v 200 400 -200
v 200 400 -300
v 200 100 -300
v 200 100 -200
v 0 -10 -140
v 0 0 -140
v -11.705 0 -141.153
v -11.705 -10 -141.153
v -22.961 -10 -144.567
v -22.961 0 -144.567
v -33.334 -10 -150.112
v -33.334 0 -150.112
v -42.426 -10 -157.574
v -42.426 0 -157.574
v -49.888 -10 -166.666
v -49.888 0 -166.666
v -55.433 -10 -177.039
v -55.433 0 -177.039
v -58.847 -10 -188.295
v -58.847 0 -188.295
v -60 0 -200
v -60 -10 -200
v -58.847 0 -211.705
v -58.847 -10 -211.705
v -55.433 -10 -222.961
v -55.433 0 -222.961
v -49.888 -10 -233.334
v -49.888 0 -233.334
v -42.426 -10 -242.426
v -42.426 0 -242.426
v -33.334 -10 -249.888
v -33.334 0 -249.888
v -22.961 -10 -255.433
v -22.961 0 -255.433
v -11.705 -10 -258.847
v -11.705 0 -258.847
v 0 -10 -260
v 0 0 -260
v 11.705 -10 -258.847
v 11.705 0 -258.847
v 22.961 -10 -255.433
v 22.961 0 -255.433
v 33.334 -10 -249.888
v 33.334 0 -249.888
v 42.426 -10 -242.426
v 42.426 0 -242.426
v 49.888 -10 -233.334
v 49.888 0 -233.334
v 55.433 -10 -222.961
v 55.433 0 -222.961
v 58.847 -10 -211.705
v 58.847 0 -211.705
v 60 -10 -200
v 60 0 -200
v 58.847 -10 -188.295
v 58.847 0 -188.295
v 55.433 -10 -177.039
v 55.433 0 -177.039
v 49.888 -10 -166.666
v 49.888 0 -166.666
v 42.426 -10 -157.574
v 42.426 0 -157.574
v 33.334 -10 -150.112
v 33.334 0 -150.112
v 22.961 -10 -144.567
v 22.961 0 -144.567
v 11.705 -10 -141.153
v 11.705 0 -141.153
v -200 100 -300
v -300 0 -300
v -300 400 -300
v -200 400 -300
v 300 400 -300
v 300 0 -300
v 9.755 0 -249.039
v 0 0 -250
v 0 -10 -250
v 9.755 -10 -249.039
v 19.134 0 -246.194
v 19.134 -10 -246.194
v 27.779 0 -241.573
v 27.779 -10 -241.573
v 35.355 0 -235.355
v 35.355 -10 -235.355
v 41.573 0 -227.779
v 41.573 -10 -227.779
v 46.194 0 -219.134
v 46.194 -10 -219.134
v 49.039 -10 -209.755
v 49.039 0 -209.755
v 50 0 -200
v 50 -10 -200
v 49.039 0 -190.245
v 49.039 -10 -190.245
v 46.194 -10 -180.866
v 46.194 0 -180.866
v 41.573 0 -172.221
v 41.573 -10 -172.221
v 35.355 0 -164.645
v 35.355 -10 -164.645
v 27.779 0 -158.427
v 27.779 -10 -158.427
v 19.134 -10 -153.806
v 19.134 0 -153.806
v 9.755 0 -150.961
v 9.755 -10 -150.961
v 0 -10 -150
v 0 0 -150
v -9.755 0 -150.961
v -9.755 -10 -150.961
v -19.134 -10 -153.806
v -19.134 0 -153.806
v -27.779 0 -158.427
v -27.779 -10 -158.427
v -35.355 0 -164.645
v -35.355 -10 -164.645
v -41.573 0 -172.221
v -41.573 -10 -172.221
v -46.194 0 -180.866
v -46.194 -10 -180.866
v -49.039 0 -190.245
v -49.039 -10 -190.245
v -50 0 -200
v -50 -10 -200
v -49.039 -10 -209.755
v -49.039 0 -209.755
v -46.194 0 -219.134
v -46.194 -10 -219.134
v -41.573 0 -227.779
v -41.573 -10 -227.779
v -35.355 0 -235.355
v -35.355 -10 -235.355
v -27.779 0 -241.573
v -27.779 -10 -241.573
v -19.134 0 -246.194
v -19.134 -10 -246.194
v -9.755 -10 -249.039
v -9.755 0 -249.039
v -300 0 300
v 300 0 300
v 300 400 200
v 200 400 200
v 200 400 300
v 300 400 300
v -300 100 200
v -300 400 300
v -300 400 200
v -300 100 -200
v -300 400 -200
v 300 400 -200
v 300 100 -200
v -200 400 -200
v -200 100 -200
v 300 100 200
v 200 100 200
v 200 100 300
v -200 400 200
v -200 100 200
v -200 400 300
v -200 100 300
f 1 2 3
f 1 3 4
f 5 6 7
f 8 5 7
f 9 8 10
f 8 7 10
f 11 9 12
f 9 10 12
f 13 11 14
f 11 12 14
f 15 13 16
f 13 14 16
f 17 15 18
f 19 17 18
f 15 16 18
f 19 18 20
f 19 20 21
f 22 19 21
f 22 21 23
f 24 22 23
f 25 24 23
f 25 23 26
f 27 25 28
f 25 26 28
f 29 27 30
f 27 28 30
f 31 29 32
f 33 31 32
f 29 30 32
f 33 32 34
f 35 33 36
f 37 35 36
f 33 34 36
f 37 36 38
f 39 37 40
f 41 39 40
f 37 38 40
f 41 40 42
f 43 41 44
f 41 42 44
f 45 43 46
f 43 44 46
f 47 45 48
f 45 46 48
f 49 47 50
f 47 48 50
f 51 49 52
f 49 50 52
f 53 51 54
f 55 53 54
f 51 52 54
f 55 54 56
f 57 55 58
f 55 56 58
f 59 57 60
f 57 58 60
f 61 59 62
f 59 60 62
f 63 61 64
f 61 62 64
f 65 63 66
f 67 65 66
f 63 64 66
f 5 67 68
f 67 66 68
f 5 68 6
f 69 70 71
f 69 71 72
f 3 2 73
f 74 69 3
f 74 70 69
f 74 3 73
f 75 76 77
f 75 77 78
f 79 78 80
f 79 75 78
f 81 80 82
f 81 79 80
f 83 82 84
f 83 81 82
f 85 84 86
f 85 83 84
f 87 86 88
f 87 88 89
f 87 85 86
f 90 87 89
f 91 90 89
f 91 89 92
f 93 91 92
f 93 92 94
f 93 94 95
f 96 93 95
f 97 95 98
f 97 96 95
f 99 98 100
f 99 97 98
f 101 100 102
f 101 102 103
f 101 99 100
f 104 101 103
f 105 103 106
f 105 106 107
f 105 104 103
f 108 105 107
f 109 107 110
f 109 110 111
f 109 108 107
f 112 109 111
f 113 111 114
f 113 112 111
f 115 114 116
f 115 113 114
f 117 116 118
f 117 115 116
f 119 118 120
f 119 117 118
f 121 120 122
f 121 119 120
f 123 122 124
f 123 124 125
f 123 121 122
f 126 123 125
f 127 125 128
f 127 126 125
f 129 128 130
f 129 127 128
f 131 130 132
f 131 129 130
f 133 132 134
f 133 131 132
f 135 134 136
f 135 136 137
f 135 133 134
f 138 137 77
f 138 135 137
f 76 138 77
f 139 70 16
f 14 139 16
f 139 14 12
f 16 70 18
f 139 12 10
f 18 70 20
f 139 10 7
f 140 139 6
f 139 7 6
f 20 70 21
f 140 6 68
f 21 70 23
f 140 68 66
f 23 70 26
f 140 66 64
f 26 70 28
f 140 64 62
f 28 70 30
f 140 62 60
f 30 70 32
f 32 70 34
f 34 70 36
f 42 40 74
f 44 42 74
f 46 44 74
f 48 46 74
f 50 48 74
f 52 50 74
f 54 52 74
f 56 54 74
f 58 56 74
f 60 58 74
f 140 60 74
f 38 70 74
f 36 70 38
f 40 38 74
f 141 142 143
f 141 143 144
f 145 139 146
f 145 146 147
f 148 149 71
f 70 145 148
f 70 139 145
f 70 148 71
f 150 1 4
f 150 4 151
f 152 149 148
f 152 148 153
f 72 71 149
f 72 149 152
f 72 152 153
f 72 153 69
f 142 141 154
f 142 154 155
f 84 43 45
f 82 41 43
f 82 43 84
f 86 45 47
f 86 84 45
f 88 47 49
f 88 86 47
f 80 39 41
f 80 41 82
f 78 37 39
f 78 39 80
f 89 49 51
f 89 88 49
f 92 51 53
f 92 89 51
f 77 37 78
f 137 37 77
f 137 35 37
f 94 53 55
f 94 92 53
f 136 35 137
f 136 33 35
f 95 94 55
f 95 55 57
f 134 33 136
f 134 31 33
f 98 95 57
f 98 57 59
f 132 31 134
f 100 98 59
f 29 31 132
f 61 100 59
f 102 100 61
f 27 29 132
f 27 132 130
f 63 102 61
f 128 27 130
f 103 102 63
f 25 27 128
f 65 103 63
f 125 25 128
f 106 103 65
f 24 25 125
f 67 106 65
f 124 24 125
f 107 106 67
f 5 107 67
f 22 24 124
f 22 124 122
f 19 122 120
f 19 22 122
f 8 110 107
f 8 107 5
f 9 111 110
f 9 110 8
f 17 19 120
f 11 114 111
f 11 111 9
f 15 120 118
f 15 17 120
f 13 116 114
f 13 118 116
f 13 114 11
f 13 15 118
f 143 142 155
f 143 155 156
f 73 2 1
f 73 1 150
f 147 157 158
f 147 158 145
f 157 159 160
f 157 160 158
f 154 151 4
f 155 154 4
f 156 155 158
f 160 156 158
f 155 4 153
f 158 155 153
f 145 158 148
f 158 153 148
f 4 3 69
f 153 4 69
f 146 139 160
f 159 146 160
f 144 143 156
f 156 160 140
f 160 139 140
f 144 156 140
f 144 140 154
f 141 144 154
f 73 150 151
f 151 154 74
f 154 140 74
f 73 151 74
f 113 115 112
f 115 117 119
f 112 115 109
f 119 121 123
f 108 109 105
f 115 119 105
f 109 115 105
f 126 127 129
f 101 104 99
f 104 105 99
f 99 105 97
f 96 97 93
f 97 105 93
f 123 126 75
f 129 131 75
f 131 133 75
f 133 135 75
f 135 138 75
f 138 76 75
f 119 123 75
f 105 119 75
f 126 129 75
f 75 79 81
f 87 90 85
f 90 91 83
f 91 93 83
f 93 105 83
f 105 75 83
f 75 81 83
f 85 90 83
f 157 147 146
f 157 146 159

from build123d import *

# Parameters (mm, degrees)
SKETCH_1_W          = 600
SKETCH_1_H          = 600
EXTRUDE_1_DEPTH     = 400
CUT_EXTRUDE_1_DEPTH = 300
SKETCH_3_R          = 60
SKETCH_3_R_2        = 50
EXTRUDE_2_DEPTH     = 10


with BuildPart() as part:
    # 草图1 → 凸台-拉伸1 (new body)
    with BuildSketch(Plane(origin=(0, 0, 0), x_dir=(1, 0, 0), z_dir=(0, 1, 0))):
        Rectangle(SKETCH_1_W, SKETCH_1_H)
    extrude(amount=EXTRUDE_1_DEPTH)

    # 草图2 → 切除-拉伸1 (cut)
    with BuildSketch(Plane(origin=(0, 400, 0), x_dir=(1, 0, 0), z_dir=(0, 1, 0))):
        Polygon((-500, 200), (-200, 200), (-200, 500), (200, 500), (200, 200), (500, 200), (500, -200), (200, -200), (200, -500), (-200, -500), (-200, -200), (-500, -200), align=None)
    extrude(amount=-CUT_EXTRUDE_1_DEPTH, mode=Mode.SUBTRACT)

    # 草图3 → 凸台-拉伸2 (add)
    with BuildSketch(Plane.XZ):
        with Locations(Location((0, -200, 0), (0, 0, 90))):
            Circle(SKETCH_3_R)
        with Locations(Location((0, -200, 0), (0, 0, 270))):
            Circle(SKETCH_3_R_2, mode=Mode.SUBTRACT)
    extrude(amount=EXTRUDE_2_DEPTH)


solid = part.part
